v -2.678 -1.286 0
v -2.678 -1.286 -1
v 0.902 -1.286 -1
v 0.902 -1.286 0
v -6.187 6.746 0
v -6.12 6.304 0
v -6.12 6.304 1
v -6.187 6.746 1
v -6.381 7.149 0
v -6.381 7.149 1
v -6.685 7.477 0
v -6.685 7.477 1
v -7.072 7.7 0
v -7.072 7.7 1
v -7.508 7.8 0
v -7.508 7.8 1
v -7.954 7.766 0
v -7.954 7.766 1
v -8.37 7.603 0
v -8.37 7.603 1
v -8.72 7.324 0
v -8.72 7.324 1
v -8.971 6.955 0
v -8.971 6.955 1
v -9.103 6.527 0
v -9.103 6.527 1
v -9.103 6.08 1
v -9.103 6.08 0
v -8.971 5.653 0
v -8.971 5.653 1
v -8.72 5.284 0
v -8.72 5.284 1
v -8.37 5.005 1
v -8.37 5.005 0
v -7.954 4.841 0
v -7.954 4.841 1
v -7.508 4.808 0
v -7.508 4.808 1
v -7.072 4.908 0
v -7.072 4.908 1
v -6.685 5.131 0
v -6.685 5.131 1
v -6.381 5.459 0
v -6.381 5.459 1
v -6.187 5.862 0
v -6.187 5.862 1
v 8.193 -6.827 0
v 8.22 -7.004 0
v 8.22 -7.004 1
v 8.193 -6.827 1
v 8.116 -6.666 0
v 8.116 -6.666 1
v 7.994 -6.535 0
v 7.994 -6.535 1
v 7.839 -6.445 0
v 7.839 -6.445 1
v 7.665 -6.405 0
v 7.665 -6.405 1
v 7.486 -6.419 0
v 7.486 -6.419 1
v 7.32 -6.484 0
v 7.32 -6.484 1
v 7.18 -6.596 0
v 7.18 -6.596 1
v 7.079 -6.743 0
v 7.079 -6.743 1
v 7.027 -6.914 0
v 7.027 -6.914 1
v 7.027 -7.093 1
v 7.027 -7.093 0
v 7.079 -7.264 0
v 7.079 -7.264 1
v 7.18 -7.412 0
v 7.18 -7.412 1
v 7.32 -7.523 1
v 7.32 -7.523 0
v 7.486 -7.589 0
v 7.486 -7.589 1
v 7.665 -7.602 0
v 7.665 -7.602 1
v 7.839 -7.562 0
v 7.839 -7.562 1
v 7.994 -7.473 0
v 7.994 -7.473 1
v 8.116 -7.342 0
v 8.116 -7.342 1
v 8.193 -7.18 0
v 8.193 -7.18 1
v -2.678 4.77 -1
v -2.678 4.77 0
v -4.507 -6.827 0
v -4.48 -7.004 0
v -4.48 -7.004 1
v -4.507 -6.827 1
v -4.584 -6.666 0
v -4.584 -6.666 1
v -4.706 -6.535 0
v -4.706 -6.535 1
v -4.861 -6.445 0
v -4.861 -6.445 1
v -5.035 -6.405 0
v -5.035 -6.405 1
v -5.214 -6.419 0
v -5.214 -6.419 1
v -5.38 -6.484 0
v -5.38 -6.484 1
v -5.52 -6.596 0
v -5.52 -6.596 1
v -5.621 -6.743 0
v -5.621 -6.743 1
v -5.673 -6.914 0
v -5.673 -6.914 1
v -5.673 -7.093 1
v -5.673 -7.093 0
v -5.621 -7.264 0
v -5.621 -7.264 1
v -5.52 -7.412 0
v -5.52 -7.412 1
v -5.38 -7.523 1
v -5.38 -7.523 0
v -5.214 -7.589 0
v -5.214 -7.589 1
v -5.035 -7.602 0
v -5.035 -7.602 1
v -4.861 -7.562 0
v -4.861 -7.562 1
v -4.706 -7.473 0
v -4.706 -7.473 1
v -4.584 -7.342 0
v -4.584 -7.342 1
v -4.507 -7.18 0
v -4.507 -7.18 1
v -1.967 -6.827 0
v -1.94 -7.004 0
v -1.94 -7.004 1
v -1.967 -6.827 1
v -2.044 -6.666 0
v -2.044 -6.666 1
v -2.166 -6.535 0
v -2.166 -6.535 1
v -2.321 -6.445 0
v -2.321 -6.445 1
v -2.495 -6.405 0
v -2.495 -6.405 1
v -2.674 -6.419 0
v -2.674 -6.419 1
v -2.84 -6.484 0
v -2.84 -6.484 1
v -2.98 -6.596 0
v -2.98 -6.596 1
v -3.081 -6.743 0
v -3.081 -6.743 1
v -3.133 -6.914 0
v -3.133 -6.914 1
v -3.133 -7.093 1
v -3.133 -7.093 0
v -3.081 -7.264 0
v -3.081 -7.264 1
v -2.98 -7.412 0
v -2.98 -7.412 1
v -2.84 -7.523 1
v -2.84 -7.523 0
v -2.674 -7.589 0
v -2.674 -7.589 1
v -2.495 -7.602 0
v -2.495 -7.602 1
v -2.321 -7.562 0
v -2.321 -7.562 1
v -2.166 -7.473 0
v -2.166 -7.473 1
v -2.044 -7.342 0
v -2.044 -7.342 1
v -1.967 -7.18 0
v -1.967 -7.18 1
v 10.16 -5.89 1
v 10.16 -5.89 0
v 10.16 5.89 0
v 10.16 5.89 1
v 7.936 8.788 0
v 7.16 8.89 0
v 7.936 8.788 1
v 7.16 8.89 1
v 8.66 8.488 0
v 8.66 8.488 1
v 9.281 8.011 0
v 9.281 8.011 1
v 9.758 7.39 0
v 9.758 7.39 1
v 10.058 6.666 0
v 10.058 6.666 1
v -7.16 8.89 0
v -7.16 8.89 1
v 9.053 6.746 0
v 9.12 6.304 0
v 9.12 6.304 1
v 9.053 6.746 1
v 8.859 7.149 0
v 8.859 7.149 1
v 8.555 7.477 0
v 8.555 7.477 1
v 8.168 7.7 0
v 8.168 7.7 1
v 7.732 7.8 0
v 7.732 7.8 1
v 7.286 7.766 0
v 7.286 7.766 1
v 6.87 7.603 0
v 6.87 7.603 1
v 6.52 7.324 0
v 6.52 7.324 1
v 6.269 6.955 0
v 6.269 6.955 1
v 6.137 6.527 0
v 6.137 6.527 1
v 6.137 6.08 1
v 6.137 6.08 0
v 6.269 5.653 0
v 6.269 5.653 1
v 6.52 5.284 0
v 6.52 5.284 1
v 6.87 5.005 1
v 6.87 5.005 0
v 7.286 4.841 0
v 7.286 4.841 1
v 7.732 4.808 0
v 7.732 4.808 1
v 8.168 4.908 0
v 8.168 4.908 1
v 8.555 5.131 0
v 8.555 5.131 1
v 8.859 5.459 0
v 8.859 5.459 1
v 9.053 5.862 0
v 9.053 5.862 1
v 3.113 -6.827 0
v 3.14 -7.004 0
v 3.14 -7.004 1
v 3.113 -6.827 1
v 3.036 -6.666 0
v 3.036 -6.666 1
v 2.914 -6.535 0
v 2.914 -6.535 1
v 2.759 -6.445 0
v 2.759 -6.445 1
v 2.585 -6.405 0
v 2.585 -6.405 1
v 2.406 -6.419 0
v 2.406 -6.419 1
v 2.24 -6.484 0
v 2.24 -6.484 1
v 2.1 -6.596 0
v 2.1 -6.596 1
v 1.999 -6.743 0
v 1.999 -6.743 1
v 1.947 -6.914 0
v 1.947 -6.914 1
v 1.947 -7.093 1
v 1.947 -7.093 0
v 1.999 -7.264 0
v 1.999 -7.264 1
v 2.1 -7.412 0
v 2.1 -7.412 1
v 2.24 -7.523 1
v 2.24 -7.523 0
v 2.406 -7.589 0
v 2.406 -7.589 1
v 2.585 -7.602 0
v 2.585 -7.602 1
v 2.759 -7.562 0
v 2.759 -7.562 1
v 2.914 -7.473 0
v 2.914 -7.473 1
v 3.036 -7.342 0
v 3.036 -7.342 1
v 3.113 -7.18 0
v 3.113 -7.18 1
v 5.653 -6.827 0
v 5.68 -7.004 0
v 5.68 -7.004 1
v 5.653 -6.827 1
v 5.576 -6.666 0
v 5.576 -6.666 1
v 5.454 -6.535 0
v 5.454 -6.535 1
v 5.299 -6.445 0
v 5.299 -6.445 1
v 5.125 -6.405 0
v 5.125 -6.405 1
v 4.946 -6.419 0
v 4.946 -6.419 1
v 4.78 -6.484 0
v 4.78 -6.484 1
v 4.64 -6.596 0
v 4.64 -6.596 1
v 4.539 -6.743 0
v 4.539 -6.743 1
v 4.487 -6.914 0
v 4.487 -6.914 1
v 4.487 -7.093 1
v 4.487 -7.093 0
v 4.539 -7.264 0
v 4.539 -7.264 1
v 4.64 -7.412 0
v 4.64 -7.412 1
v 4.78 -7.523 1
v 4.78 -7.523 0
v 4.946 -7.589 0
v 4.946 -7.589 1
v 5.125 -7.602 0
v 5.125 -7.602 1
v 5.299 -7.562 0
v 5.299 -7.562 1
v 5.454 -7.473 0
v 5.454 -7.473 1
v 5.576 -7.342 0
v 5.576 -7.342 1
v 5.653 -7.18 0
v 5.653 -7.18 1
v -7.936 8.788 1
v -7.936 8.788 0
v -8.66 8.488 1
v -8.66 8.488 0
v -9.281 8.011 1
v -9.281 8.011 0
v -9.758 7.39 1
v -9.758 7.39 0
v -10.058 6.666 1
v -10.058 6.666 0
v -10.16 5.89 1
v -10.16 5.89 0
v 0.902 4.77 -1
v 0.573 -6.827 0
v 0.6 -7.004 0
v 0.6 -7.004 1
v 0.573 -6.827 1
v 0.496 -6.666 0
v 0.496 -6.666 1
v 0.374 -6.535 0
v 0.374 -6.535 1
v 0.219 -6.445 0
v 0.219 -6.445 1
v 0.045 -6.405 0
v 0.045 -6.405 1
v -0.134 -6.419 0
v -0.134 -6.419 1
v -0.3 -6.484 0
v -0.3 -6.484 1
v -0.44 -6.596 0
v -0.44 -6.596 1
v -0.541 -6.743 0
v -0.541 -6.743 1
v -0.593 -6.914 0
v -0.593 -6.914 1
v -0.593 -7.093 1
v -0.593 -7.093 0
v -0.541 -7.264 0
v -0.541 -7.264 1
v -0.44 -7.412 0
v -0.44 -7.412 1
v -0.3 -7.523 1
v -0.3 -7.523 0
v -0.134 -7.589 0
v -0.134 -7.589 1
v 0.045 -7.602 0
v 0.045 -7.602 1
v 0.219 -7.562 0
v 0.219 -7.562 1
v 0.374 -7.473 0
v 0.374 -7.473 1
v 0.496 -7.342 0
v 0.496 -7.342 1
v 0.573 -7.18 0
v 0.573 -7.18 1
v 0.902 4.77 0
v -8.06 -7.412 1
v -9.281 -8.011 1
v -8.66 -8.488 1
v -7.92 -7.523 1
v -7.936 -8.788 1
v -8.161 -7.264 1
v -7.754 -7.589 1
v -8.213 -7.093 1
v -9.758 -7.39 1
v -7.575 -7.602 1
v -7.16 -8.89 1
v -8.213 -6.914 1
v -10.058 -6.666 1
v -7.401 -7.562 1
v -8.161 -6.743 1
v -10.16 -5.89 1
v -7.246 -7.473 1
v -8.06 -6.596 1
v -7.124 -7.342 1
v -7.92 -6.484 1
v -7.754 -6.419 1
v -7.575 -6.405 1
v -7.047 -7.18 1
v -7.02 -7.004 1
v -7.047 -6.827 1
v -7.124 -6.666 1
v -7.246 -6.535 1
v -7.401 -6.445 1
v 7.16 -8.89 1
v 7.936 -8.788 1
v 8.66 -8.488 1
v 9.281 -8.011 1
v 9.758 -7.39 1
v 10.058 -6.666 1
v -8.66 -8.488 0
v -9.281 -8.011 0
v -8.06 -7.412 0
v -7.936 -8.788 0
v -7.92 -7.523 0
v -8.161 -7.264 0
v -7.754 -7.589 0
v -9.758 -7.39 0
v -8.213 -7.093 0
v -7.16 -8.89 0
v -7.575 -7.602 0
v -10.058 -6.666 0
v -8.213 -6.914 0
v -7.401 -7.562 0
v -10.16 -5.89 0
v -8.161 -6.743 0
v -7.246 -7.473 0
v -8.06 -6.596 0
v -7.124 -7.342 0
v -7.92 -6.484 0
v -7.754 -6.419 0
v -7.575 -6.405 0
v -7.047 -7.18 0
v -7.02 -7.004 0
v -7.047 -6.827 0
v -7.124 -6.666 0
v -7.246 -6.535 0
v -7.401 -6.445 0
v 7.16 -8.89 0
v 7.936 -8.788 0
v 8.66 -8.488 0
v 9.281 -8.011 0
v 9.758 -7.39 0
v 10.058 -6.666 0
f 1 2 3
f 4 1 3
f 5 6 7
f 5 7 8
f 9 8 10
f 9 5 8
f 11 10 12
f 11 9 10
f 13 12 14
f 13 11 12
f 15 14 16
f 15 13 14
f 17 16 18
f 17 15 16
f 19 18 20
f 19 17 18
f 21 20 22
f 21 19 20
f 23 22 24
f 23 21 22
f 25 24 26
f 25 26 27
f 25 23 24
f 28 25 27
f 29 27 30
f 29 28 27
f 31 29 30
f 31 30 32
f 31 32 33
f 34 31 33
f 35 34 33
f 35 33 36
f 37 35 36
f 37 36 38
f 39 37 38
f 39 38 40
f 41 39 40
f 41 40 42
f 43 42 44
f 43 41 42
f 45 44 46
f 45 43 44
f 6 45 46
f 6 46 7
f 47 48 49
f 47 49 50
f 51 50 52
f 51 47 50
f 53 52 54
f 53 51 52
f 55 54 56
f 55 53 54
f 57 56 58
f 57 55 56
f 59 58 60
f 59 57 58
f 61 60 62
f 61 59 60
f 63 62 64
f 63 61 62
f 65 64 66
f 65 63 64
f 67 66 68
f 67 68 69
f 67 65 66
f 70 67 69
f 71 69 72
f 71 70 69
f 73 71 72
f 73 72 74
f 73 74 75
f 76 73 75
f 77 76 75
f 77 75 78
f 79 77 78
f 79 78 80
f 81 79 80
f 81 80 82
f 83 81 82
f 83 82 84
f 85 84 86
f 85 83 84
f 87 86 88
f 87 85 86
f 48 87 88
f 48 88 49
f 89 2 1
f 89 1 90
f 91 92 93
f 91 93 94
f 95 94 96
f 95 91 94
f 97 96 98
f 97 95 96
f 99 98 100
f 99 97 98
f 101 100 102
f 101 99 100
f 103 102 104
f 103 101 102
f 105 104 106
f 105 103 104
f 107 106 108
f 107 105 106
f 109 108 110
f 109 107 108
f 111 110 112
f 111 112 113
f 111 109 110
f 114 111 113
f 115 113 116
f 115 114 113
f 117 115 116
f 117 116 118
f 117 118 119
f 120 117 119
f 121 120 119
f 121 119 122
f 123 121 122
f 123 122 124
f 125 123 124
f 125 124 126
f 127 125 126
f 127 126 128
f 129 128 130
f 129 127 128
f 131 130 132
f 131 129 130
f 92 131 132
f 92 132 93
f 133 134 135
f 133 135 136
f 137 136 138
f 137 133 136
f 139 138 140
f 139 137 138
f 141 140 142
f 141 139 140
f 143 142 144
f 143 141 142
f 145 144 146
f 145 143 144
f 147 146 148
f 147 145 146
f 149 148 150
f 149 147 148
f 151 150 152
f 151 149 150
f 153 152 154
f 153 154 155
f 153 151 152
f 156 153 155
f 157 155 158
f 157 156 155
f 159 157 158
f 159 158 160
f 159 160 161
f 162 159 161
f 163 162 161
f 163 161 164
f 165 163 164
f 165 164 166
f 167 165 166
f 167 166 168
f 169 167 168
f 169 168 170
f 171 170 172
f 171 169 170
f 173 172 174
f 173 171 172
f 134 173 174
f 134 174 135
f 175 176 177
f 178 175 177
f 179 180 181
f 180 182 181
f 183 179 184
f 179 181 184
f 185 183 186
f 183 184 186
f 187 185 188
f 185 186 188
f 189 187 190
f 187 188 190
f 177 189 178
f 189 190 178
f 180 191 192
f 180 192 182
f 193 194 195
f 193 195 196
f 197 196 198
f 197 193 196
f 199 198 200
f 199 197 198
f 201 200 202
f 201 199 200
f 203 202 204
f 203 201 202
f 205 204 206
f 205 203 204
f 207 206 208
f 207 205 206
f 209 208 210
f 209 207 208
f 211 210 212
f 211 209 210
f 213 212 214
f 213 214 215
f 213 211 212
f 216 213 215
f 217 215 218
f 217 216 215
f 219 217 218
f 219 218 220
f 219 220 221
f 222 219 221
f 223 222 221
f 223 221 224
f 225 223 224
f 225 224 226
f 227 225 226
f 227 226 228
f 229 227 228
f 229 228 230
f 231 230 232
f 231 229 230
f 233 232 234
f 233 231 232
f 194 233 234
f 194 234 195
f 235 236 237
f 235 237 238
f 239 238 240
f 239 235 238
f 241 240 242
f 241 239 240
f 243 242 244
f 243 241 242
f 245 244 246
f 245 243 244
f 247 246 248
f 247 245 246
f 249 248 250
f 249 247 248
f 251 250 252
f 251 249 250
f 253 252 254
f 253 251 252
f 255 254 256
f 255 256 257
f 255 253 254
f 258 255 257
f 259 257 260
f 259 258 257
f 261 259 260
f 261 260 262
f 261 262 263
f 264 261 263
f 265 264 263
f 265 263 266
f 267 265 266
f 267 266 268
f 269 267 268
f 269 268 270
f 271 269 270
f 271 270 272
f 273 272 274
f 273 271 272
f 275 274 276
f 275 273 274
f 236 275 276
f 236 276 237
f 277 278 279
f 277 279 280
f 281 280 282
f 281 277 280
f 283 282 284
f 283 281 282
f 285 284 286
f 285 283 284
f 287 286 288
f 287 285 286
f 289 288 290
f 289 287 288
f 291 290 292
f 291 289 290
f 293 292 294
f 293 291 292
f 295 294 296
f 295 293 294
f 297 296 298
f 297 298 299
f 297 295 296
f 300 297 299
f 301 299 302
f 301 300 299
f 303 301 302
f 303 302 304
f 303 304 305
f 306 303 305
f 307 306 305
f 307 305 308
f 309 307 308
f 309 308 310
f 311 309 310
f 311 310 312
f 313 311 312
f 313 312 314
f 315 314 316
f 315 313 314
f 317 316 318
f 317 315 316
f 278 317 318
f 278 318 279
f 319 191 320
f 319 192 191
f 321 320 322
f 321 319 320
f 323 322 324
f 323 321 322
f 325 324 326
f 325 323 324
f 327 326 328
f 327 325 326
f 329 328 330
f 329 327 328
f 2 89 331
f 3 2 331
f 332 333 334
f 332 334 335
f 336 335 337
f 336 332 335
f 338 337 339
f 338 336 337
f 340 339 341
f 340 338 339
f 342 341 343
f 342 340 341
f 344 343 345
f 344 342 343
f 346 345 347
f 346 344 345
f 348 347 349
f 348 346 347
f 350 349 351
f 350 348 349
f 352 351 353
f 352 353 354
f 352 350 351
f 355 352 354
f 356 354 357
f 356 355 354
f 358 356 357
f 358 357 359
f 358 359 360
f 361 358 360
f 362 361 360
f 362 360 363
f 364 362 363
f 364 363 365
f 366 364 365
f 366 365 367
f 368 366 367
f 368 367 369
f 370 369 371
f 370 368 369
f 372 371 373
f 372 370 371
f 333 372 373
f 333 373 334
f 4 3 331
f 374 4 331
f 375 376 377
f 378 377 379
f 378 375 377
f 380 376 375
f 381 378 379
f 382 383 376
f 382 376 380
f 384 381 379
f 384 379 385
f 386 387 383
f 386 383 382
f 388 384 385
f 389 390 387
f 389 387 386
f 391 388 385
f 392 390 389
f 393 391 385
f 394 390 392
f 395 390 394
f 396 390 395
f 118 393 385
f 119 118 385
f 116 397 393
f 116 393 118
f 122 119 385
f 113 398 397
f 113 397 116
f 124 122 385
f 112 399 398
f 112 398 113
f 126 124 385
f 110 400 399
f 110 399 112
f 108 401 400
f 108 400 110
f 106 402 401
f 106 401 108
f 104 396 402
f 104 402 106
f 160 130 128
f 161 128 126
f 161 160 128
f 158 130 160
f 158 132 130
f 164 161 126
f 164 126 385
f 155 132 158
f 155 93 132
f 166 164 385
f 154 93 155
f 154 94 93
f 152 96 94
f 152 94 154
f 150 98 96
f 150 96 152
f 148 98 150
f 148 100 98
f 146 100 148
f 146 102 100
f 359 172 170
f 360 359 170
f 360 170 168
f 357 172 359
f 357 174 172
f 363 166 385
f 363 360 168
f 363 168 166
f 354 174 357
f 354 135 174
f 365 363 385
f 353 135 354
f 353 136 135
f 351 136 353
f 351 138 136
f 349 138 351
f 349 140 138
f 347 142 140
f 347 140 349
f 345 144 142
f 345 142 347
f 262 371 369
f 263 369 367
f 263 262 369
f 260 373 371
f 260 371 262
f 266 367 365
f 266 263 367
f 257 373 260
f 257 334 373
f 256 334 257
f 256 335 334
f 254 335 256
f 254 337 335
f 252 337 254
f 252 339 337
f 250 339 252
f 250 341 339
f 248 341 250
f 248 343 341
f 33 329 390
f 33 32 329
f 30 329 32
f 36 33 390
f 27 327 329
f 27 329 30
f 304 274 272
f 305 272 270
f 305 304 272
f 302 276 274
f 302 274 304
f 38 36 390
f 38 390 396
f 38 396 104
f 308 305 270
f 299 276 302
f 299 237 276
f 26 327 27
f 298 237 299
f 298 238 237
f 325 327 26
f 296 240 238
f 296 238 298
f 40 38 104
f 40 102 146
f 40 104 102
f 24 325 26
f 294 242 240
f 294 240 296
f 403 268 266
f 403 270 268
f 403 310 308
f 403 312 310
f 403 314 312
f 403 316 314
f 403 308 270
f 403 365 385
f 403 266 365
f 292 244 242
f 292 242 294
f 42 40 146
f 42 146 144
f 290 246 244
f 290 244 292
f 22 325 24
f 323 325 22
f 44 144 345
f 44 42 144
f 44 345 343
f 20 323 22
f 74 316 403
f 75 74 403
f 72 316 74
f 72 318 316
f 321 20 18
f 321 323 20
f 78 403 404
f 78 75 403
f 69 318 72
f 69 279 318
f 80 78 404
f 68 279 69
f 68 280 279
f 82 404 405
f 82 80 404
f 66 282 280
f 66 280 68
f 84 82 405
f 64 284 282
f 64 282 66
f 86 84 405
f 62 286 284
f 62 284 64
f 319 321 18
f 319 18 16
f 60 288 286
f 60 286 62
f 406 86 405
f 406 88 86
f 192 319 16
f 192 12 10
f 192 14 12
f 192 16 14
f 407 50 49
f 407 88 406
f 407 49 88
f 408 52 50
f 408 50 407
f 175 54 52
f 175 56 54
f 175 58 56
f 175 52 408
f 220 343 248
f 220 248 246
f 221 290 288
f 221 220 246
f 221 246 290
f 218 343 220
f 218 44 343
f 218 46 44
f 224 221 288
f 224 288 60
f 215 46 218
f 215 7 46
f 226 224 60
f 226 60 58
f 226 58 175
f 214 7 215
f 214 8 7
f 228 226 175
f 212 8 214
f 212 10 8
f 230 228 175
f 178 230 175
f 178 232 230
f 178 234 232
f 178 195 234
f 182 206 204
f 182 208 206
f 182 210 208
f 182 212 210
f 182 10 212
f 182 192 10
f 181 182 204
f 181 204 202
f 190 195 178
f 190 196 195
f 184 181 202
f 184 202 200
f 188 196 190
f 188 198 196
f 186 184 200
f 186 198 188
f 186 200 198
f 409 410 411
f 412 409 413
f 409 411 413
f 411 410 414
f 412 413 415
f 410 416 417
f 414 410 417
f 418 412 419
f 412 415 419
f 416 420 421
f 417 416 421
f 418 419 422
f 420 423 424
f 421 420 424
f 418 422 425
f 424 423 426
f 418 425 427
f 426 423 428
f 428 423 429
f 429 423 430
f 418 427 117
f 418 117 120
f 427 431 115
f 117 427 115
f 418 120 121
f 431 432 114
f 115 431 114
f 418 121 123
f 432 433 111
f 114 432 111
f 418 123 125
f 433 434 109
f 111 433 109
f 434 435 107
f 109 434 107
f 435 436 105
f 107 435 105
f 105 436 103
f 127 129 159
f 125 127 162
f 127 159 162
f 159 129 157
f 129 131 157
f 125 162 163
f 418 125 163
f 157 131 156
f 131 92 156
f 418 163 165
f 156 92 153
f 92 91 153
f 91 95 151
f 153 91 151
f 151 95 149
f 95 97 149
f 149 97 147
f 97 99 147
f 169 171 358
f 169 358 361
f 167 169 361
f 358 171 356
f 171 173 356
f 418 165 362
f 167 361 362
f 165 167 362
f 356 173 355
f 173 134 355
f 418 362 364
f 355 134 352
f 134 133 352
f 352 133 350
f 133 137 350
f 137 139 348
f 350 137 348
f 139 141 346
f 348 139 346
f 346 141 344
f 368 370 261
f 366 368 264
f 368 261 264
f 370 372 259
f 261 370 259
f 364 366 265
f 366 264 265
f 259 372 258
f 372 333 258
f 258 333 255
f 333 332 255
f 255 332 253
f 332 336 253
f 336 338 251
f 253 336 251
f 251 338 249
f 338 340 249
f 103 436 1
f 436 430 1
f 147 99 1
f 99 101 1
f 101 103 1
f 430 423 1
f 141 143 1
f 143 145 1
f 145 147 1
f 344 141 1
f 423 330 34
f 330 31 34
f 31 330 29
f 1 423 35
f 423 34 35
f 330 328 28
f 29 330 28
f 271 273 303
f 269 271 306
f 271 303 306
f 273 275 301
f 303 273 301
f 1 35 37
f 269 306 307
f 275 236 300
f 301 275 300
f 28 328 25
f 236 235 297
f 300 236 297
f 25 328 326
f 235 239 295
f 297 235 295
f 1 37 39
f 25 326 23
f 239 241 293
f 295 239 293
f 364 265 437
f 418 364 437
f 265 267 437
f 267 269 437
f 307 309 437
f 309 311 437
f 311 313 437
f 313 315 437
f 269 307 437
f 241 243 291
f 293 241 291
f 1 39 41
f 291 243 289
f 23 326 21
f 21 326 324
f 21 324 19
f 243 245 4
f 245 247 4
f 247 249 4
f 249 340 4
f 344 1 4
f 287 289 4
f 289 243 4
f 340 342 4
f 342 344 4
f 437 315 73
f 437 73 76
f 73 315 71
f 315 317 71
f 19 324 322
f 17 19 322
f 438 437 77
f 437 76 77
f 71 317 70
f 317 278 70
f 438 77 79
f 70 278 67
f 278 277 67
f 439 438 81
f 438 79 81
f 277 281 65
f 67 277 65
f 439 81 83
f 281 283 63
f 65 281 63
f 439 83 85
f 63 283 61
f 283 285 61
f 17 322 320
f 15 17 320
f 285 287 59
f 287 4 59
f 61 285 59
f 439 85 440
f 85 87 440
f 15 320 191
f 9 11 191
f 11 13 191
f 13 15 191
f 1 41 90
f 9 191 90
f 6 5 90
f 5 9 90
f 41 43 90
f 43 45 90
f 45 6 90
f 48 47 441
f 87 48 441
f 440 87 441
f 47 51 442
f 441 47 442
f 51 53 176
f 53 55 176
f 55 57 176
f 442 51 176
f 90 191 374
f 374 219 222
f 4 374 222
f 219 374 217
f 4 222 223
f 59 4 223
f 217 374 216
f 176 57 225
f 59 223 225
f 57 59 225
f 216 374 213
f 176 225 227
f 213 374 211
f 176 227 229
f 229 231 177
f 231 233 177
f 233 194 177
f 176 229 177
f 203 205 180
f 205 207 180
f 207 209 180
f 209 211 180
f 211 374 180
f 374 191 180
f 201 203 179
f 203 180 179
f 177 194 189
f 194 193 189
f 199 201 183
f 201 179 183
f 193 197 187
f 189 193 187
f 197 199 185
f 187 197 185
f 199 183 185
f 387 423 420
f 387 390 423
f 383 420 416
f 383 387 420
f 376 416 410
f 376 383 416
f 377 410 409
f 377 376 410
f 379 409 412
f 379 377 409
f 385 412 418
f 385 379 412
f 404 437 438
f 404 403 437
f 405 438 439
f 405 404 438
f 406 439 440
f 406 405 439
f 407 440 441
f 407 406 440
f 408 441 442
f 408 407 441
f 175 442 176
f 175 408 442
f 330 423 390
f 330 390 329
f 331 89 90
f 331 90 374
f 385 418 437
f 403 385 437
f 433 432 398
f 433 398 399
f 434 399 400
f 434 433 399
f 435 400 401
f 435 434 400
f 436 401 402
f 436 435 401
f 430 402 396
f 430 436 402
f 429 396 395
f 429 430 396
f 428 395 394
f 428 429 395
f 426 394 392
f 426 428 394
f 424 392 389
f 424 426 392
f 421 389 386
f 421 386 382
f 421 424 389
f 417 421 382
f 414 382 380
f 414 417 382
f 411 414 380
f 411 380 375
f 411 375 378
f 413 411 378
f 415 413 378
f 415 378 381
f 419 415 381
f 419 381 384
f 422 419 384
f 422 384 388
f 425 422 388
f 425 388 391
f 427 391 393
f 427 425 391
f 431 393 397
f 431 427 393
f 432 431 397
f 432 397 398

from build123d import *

# Parameters (mm, degrees)
SKETCH_1_W           = 20.32
SKETCH_1_H           = 17.78
SKETCH_1_R           = 1.5
SKETCH_1_R_2         = 0.6
EXTRUDE_1_DEPTH      = 1
FILLET_2_R           = 3
FILLET_3_R           = 3
FILLET_4_R           = 3
FILLET_5_R           = 3
EXTRUDE_2_DEPTH      = 1
EXTRUDE_2_DEPTH_BACK = 1
SKETCH_2_W           = 3.580076994
SKETCH_2_H           = 6.056150923


with BuildPart() as part:
    # 草图1 → 凸台-拉伸1 (new body)
    with BuildSketch(Plane.XY):
        Rectangle(SKETCH_1_W, SKETCH_1_H)
        with Locations((-7.62, 6.303875277)):
            Circle(SKETCH_1_R, mode=Mode.SUBTRACT)
        with Locations((7.62, 6.303875277)):
            Circle(SKETCH_1_R, mode=Mode.SUBTRACT)
        with Locations((-7.62, -7.003605695)):
            Circle(SKETCH_1_R_2, mode=Mode.SUBTRACT)
        with Locations((-5.08, -7.003605695)):
            Circle(SKETCH_1_R_2, mode=Mode.SUBTRACT)
        with Locations((-2.54, -7.003605695)):
            Circle(SKETCH_1_R_2, mode=Mode.SUBTRACT)
        with Locations((0, -7.003605695)):
            Circle(SKETCH_1_R_2, mode=Mode.SUBTRACT)
        with Locations((2.54, -7.003605695)):
            Circle(SKETCH_1_R_2, mode=Mode.SUBTRACT)
        with Locations((5.08, -7.003605695)):
            Circle(SKETCH_1_R_2, mode=Mode.SUBTRACT)
        with Locations((7.62, -7.003605695)):
            Circle(SKETCH_1_R_2, mode=Mode.SUBTRACT)
    extrude(amount=EXTRUDE_1_DEPTH)

    # 圆角2
    fillet_2_edges = [part.edges().sort_by_distance(p)[0] for p in [
        (10.16, 8.89, 0.5),
    ]]
    fillet(fillet_2_edges, radius=FILLET_2_R)

    # 圆角3
    fillet_3_edges = [part.edges().sort_by_distance(p)[0] for p in [
        (-10.16, 8.89, 0.5),
    ]]
    fillet(fillet_3_edges, radius=FILLET_3_R)

    # 圆角4
    fillet_4_edges = [part.edges().sort_by_distance(p)[0] for p in [
        (-10.16, -8.89, 0.5),
    ]]
    fillet(fillet_4_edges, radius=FILLET_4_R)

    # 圆角5
    fillet_5_edges = [part.edges().sort_by_distance(p)[0] for p in [
        (10.16, -8.89, 0.5),
    ]]
    fillet(fillet_5_edges, radius=FILLET_5_R)

    # 草图2 → 凸台-拉伸2 (add, two sides: drawn at the far end of the back side and taken through both)
    with BuildSketch(Plane.XY.offset(-EXTRUDE_2_DEPTH_BACK)):
        with Locations((-0.887963615, 1.742289852)):
            Rectangle(SKETCH_2_W, SKETCH_2_H)
    extrude(amount=EXTRUDE_2_DEPTH + EXTRUDE_2_DEPTH_BACK)


solid = part.part
